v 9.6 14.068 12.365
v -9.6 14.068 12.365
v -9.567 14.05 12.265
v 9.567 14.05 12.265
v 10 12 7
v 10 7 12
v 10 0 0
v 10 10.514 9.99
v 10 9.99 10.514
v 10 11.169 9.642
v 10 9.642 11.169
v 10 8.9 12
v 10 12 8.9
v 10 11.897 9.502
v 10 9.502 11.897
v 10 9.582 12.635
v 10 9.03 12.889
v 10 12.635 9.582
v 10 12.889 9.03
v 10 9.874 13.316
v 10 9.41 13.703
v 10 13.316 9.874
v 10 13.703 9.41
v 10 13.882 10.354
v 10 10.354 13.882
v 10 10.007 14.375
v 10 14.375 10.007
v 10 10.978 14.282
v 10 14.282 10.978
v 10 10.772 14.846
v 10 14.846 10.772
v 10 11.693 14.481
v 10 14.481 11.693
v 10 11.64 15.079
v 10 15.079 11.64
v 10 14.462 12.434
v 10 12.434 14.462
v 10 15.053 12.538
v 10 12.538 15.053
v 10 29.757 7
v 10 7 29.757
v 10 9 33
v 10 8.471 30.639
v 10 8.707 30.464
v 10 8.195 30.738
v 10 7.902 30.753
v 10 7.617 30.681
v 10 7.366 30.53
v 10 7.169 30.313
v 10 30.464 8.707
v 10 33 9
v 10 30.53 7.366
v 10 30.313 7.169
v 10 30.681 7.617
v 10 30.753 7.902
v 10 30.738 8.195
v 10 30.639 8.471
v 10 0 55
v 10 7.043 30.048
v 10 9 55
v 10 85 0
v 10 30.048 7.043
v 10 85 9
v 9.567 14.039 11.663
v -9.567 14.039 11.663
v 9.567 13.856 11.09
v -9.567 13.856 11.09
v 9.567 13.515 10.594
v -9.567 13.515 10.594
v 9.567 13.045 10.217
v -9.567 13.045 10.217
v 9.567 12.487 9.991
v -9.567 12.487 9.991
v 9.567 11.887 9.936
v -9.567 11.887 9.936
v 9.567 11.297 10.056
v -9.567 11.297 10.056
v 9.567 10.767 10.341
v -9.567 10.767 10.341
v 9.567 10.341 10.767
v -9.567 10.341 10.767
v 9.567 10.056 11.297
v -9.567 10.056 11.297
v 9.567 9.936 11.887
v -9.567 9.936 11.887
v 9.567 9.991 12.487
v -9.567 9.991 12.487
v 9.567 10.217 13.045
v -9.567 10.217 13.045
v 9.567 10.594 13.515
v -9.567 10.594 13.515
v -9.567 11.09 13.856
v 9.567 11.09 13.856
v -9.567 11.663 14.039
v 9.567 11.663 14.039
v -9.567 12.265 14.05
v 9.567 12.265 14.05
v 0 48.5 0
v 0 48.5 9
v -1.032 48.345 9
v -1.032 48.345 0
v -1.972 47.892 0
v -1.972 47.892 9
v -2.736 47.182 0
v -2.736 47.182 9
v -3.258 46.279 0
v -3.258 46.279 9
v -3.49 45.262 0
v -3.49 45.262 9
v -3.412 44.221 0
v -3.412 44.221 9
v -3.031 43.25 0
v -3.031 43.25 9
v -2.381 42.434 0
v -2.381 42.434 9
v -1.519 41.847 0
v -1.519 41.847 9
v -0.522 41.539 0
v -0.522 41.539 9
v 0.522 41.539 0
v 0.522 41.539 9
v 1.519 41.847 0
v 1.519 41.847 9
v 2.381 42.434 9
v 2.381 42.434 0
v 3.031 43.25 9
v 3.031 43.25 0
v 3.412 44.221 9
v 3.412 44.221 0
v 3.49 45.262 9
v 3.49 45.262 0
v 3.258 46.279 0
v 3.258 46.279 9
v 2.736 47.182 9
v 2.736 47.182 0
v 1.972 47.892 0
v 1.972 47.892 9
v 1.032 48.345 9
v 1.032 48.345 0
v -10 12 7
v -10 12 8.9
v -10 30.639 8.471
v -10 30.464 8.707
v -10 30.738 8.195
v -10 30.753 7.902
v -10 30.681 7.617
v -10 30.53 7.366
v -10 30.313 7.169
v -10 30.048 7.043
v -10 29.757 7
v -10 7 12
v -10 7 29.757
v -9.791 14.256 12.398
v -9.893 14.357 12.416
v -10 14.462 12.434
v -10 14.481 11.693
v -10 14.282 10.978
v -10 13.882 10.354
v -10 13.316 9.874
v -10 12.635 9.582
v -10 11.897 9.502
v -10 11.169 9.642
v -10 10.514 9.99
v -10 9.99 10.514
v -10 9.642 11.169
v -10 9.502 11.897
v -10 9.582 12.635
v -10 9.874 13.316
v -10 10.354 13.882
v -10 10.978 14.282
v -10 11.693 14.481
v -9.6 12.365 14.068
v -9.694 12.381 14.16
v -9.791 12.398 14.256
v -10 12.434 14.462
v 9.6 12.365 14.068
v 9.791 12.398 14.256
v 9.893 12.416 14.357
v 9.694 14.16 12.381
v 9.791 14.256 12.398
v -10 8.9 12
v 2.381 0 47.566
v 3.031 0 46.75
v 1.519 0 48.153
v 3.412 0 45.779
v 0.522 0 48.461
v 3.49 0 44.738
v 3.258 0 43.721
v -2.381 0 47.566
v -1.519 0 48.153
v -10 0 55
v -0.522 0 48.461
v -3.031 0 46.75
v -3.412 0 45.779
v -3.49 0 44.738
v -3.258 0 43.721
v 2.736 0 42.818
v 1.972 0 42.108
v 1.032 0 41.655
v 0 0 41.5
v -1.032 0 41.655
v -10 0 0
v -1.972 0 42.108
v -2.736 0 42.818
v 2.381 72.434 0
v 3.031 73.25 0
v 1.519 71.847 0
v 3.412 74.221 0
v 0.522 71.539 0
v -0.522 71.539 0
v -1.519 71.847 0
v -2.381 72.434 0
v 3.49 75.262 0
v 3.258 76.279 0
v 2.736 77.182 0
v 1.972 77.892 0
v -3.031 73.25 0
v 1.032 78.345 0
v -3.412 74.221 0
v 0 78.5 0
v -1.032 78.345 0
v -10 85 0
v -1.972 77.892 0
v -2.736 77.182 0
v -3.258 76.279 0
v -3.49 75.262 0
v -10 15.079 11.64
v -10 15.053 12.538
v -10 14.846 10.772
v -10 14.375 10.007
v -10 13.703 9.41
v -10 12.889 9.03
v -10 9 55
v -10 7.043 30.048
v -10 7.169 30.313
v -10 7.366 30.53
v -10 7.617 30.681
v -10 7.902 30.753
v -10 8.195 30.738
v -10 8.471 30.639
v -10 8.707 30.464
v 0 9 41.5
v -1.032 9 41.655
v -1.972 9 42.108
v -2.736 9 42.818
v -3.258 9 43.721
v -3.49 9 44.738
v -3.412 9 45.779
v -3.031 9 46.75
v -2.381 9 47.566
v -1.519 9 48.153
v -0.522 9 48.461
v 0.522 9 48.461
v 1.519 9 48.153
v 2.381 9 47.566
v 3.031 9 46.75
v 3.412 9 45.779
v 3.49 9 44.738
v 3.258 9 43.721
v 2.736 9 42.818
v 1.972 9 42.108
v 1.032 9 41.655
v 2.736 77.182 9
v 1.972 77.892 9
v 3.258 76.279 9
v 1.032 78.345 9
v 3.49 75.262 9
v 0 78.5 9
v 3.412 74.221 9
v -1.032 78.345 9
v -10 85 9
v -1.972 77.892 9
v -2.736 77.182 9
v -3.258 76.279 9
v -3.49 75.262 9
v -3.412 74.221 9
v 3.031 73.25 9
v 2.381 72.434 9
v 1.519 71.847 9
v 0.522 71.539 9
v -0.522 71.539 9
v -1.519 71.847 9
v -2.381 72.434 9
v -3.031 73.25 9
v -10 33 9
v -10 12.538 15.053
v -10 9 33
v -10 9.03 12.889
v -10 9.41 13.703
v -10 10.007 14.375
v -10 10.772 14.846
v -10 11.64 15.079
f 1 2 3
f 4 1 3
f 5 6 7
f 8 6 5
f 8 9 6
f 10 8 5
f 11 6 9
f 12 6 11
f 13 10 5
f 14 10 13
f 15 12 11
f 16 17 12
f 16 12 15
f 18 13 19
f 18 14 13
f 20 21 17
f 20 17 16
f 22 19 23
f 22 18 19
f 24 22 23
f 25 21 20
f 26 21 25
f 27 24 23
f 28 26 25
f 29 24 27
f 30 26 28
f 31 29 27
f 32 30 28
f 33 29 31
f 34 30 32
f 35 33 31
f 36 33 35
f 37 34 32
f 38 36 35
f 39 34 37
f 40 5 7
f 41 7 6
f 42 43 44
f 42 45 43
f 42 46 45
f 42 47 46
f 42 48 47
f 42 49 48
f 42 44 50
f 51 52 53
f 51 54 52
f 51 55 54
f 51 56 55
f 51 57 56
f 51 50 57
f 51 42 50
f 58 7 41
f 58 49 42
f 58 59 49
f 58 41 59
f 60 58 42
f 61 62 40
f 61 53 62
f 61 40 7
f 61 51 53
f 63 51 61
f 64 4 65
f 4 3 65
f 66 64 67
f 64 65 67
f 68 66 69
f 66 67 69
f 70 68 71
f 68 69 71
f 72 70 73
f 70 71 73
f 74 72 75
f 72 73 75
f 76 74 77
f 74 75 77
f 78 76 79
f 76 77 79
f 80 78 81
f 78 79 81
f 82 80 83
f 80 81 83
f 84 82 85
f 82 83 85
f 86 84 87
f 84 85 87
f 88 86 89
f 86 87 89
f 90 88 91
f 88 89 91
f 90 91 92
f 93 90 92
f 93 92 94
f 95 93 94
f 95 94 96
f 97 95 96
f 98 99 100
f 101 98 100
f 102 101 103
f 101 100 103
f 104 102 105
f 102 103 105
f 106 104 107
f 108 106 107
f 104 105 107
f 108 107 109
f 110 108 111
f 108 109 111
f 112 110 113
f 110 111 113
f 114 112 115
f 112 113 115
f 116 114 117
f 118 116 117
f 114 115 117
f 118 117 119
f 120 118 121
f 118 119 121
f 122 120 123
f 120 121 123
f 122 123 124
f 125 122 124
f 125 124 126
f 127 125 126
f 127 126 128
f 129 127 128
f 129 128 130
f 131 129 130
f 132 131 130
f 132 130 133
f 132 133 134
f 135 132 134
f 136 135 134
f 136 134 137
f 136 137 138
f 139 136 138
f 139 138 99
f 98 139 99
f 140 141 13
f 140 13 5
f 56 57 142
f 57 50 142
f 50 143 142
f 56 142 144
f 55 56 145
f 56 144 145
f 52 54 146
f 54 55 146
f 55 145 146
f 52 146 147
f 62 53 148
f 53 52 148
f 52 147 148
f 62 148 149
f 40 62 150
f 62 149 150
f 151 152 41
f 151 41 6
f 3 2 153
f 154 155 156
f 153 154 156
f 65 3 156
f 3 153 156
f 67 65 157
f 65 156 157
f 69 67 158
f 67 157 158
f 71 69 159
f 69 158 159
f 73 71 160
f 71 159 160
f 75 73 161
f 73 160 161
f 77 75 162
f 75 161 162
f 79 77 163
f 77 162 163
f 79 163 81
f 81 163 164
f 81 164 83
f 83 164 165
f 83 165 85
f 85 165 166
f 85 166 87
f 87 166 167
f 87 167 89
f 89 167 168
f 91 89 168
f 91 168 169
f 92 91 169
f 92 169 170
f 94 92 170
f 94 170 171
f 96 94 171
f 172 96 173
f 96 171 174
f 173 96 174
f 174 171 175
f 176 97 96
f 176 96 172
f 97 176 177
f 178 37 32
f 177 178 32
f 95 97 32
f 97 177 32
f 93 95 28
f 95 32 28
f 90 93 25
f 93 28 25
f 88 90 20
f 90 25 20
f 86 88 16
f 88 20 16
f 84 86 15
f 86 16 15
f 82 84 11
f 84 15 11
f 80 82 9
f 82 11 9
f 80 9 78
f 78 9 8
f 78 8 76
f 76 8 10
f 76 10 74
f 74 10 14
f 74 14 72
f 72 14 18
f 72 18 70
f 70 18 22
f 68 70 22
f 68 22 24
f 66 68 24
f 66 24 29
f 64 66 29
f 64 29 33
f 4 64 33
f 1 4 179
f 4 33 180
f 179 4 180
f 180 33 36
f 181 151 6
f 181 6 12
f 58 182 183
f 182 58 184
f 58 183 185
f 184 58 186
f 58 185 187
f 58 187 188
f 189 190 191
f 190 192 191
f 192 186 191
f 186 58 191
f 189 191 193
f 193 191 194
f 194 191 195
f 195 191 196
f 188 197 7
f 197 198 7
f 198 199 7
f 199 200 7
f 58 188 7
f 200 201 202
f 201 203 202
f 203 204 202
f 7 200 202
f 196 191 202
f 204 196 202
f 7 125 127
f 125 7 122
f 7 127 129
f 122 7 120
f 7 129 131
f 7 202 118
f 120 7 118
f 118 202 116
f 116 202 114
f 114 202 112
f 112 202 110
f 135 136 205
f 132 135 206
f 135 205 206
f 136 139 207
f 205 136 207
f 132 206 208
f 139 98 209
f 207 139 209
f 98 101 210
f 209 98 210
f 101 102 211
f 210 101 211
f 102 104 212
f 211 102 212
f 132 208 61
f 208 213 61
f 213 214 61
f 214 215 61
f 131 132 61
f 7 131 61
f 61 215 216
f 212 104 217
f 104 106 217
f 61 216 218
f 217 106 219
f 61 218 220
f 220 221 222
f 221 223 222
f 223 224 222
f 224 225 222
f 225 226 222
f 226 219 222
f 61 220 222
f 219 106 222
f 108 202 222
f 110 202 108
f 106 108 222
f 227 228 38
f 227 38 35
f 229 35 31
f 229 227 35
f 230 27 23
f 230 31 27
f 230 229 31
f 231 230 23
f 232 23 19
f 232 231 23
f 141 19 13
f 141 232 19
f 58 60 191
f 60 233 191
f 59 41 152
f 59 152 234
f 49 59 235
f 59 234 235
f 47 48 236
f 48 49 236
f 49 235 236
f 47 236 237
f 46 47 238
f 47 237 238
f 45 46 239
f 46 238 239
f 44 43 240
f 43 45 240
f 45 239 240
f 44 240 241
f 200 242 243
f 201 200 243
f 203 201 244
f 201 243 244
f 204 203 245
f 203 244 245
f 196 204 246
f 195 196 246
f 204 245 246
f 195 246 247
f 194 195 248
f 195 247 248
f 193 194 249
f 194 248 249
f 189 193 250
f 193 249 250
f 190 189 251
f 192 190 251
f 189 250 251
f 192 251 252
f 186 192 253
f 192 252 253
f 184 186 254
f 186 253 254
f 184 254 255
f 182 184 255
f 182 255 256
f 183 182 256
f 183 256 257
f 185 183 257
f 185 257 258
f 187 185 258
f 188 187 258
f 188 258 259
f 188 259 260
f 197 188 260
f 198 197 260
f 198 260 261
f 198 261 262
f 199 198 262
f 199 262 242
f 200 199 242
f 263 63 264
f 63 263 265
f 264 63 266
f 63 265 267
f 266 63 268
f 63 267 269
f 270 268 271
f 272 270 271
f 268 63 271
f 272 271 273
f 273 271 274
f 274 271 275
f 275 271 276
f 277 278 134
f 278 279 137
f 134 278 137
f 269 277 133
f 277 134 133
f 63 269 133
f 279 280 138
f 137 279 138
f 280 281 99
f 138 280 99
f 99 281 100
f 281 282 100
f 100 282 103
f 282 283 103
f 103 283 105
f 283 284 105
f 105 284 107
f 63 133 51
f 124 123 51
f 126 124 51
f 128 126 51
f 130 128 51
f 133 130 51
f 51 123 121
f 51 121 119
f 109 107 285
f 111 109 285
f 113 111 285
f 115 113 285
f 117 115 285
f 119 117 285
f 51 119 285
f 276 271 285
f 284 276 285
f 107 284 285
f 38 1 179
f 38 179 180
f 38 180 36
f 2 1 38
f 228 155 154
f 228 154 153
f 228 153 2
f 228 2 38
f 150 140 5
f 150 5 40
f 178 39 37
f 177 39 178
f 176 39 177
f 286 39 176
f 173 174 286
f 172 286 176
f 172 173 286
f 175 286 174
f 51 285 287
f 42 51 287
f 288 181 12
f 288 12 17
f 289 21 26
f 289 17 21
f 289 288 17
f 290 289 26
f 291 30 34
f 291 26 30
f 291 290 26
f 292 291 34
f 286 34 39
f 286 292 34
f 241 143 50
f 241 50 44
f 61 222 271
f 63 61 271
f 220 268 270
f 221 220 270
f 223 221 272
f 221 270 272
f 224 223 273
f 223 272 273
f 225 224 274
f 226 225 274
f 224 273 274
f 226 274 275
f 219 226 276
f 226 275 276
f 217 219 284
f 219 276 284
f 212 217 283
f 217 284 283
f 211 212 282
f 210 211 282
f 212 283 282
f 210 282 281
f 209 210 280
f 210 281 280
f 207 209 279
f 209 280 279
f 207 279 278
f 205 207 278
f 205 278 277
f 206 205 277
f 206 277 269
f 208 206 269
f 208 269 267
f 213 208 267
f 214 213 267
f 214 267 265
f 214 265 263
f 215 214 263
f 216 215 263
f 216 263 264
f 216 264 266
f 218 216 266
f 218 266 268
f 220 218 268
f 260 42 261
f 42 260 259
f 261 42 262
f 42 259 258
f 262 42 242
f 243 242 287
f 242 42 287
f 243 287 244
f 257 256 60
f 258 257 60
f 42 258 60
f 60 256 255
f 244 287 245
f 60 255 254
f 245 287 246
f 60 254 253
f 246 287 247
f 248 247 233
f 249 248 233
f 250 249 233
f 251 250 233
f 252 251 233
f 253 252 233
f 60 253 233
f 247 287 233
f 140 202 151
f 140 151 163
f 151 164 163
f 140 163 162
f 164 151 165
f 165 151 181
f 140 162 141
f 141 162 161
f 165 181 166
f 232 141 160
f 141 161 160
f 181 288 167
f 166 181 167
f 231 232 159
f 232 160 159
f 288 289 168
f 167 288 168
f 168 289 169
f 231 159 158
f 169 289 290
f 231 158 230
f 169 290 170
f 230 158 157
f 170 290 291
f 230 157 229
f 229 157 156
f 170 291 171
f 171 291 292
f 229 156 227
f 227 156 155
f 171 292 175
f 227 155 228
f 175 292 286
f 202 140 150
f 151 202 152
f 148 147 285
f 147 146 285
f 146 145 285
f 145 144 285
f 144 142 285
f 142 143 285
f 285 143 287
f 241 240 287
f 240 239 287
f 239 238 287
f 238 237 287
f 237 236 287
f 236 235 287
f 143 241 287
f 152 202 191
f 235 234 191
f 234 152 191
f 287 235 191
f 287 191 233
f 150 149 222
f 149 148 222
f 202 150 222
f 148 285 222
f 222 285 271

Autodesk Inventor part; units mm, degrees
sketch "Sketch_1" plane through (0, 0, 0) normal (1, 0, 0) x (0, 1, 0)
  line L0 (0, 55) -> (0, 0)
  line L1 (0, 0) -> (85, 0)
  line L2 (85, 0) -> (85, 9)
  line L3 (85, 9) -> (33, 9)
  line L4 (33, 9) -> (9, 33)
  line L5 (9, 33) -> (9, 55)
  line L6 (9, 55) -> (0, 55)
  arc A0 (8.7071, 30.4645) -> (7, 29.7574) centre (8, 29.7574) ccw
  line L7 (7, 29.7574) -> (7, 12)
  line L8 (7, 12) -> (8.9, 12)
  arc A1 (12.5383, 15.0529) -> (8.9, 12) centre (12, 12) ccw
  line L9 (12.5383, 15.0529) -> (12.3647, 14.0681)
  arc A2 (12.3647, 14.0681) -> (14.0681, 12.3647) centre (12.5843, 12.5843) ccw
  line L10 (14.0681, 12.3647) -> (15.0529, 12.5383)
  arc A3 (12, 8.9) -> (15.0529, 12.5383) centre (12, 12) ccw
  line L11 (12, 8.9) -> (12, 7)
  line L12 (12, 7) -> (29.7574, 7)
  arc A4 (29.7574, 7) -> (30.4645, 8.7071) centre (29.7574, 8) ccw
  line L13 (30.4645, 8.7071) -> (8.7071, 30.4645)
extrude "Extrusion1" add sketch "Sketch_1" along normal mid plane 20
sketch "Sketch_10" plane through (0, 12, 0) normal (0, 1, 0) x (1, 0, 0)
  line L0 (-10, -12) -> (10, -12)
  line L1 (10, -12) -> (10, -14.5)
  line L2 (10, -14.5) -> (9.567, -14.067)
  line L3 (9.567, -14.067) -> (-9.567, -14.067)
  line L4 (-9.567, -14.067) -> (-10, -14.5)
  line L5 (-10, -14.5) -> (-10, -12)
  line L6 (-10, -12) -> (10, -12)
revolve "Revolution1" cut sketch "Sketch_10" angle 360 about axis through (-10, 12, 12) along (-1, 0, 0)
thread "Thread1" size "M5x0.8" class "6H" standard "ISO Metric profile" full length
sketch "Sketch3" plane through (10, 0, 0) normal (0, 0, -1) x (-1, 0, 0)
  point P0 (10, 45)
hole "Hole1" at (0, 45, 0) direction (0, 0, 1) diameter 7 depth 9
sketch "Sketch4" plane through (-10, 0, 55) normal (0, -1, 0) x (1, 0, 0)
  point P0 (10, -10)
hole "Hole2" at (0, 0, 45) direction (0, 1, 0) diameter 7 depth 9
sketch "Sketch5" plane through (10, 0, 0) normal (0, 0, -1) x (-1, 0, 0)
  point P0 (10, 75)
hole "Hole3" at (0, 75, 0) direction (0, 0, 1) diameter 7 depth 9
ref_plane "a10_to_bolt_XY" through (0, 9, 75) normal (0, 1, 0) x (1, 0, 0)
ref_plane "a10_to_bolt_YZ" through (0, 9, 75) normal (1, 0, 0) x (0, 0, -1)
ref_plane "a10_to_bolt_ZX" through (0, 9, 75) normal (0, 0, -1) x (0, 1, 0)
ref_plane "a11_to_bolt_XY" through (0, 75, 9) normal (0, 0, 1) x (1, 0, 0)
ref_plane "a11_to_bolt_YZ" through (0, 75, 9) normal (1, 0, 0) x (0, 1, 0)
ref_plane "a11_to_bolt_ZX" through (0, 75, 9) normal (0, 1, 0) x (0, 0, 1)
ref_plane "a13_to_bolt_XY" through (20, 75, 9) normal (0, 0, 1) x (1, 0, 0)
ref_plane "a13_to_bolt_YZ" through (20, 75, 9) normal (1, 0, 0) x (0, 1, 0)
ref_plane "a13_to_bolt_ZX" through (20, 75, 9) normal (0, 1, 0) x (0, 0, 1)
ref_plane "a14_to_bolt_XY" through (-20, 75, 9) normal (0, 0, 1) x (1, 0, 0)
ref_plane "a14_to_bolt_YZ" through (-20, 75, 9) normal (1, 0, 0) x (0, 1, 0)
ref_plane "a14_to_bolt_ZX" through (-20, 75, 9) normal (0, 1, 0) x (0, 0, 1)
ref_plane "a15_to_bolt_XY" through (20, 45, 9) normal (0, 0, 1) x (1, 0, 0)
ref_plane "a15_to_bolt_YZ" through (20, 45, 9) normal (1, 0, 0) x (0, 1, 0)
ref_plane "a15_to_bolt_ZX" through (20, 45, 9) normal (0, 1, 0) x (0, 0, 1)
ref_plane "a16_to_bolt_XY" through (-20, 45, 9) normal (0, 0, 1) x (1, 0, 0)
ref_plane "a16_to_bolt_YZ" through (-20, 45, 9) normal (1, 0, 0) x (0, 1, 0)
ref_plane "a16_to_bolt_ZX" through (-20, 45, 9) normal (0, 1, 0) x (0, 0, 1)
ref_plane "a17_to_bolt_XY" through (20, 9, 75) normal (0, 1, 0) x (1, 0, 0)
ref_plane "a17_to_bolt_YZ" through (20, 9, 75) normal (1, 0, 0) x (0, 0, -1)
ref_plane "a17_to_bolt_ZX" through (20, 9, 75) normal (0, 0, -1) x (0, 1, 0)
ref_plane "a18_XY" through (-20, 9, 75) normal (0, 1, 0) x (1, 0, 0)
ref_plane "a18_YZ" through (-20, 9, 75) normal (1, 0, 0) x (0, 0, -1)
ref_plane "a18_ZX" through (-20, 9, 75) normal (0, 0, -1) x (0, 1, 0)
ref_plane "a19_to_bolt_XY" through (20, 9, 45) normal (0, 1, 0) x (1, 0, 0)
ref_plane "a19_to_bolt_YZ" through (20, 9, 45) normal (1, 0, 0) x (0, 0, -1)
ref_plane "a19_to_bolt_ZX" through (20, 9, 45) normal (0, 0, -1) x (0, 1, 0)
ref_plane "a1_to_bolt_XY" through (0, 45, 9) normal (0, 0, 1) x (1, 0, 0)
ref_plane "a1_to_bolt_YZ" through (0, 45, 9) normal (1, 0, 0) x (0, 1, 0)
ref_plane "a1_to_bolt_ZX" through (0, 45, 9) normal (0, 1, 0) x (0, 0, 1)
ref_plane "a20_to_bolt_XY" through (-20, 9, 45) normal (0, 1, 0) x (1, 0, 0)
ref_plane "a20_to_bolt_YZ" through (-20, 9, 45) normal (1, 0, 0) x (0, 0, -1)
ref_plane "a20_to_bolt_ZX" through (-20, 9, 45) normal (0, 0, -1) x (0, 1, 0)
ref_plane "a2_to_bolt_XY" through (0, 9, 45) normal (0, 1, 0) x (1, 0, 0)
ref_plane "a2_to_bolt_YZ" through (0, 9, 45) normal (1, 0, 0) x (0, 0, -1)
ref_plane "a2_to_bolt_ZX" through (0, 9, 45) normal (0, 0, -1) x (0, 1, 0)
ref_plane "a3_to_bolt_XY" through (0, 75, 9) normal (0, 0, 1) x (1, 0, 0)
ref_plane "a3_to_bolt_YZ" through (0, 75, 9) normal (1, 0, 0) x (0, 1, 0)
ref_plane "a3_to_bolt_ZX" through (0, 75, 9) normal (0, 1, 0) x (0, 0, 1)
ref_plane "a4_to_bolt_XY" through (0, 75, 9) normal (0, 0, 1) x (1, 0, 0)
ref_plane "a4_to_bolt_YZ" through (0, 75, 9) normal (1, 0, 0) x (0, 1, 0)
ref_plane "a4_to_bolt_ZX" through (0, 75, 9) normal (0, 1, 0) x (0, 0, 1)
ref_plane "a5_to_bolt_XY" through (0, 9, 75) normal (0, 1, 0) x (1, 0, 0)
ref_plane "a5_to_bolt_YZ" through (0, 9, 75) normal (1, 0, 0) x (0, 0, -1)
ref_plane "a5_to_bolt_ZX" through (0, 9, 75) normal (0, 0, -1) x (0, 1, 0)
ref_plane "a6_to_bolt_XY" through (0, 9, 75) normal (0, 1, 0) x (1, 0, 0)
ref_plane "a6_to_bolt_YZ" through (0, 9, 75) normal (1, 0, 0) x (0, 0, -1)
ref_plane "a6_to_bolt_ZX" through (0, 9, 75) normal (0, 0, -1) x (0, 1, 0)
ref_plane "a7_to_bolt_XY" through (0, 75, 9) normal (0, 0, 1) x (1, 0, 0)
ref_plane "a7_to_bolt_YZ" through (0, 75, 9) normal (1, 0, 0) x (0, 1, 0)
ref_plane "a7_to_bolt_ZX" through (0, 75, 9) normal (0, 1, 0) x (0, 0, 1)
ref_plane "a8_to_bolt_XY" through (0, 75, 9) normal (0, 0, 1) x (1, 0, 0)
ref_plane "a8_to_bolt_YZ" through (0, 75, 9) normal (1, 0, 0) x (0, 1, 0)
ref_plane "a8_to_bolt_ZX" through (0, 75, 9) normal (0, 1, 0) x (0, 0, 1)
ref_plane "a9_to_bolt_XY" through (0, 9, 75) normal (0, 1, 0) x (1, 0, 0)
ref_plane "a9_to_bolt_YZ" through (0, 9, 75) normal (1, 0, 0) x (0, 0, -1)
ref_plane "a9_to_bolt_ZX" through (0, 9, 75) normal (0, 0, -1) x (0, 1, 0)
ref_plane "bracket_to_dummy_XY" through (0, 0, 0) normal (0, 1, 0) x (1, 0, 0)
ref_plane "bracket_to_dummy_YZ" through (0, 0, 0) normal (1, 0, 0) x (0, 0, -1)
ref_plane "bracket_to_dummy_ZX" through (0, 0, 0) normal (0, 0, -1) x (0, 1, 0)
ref_plane "h12_to_bolt_XY" through (0, 9, 75) normal (0, 1, 0) x (1, 0, 0)
ref_plane "h12_to_bolt_YZ" through (0, 9, 75) normal (1, 0, 0) x (0, 0, -1)
ref_plane "h12_to_bolt_ZX" through (0, 9, 75) normal (0, 0, -1) x (0, 1, 0)
properties part number "HBLTF6-C_"
